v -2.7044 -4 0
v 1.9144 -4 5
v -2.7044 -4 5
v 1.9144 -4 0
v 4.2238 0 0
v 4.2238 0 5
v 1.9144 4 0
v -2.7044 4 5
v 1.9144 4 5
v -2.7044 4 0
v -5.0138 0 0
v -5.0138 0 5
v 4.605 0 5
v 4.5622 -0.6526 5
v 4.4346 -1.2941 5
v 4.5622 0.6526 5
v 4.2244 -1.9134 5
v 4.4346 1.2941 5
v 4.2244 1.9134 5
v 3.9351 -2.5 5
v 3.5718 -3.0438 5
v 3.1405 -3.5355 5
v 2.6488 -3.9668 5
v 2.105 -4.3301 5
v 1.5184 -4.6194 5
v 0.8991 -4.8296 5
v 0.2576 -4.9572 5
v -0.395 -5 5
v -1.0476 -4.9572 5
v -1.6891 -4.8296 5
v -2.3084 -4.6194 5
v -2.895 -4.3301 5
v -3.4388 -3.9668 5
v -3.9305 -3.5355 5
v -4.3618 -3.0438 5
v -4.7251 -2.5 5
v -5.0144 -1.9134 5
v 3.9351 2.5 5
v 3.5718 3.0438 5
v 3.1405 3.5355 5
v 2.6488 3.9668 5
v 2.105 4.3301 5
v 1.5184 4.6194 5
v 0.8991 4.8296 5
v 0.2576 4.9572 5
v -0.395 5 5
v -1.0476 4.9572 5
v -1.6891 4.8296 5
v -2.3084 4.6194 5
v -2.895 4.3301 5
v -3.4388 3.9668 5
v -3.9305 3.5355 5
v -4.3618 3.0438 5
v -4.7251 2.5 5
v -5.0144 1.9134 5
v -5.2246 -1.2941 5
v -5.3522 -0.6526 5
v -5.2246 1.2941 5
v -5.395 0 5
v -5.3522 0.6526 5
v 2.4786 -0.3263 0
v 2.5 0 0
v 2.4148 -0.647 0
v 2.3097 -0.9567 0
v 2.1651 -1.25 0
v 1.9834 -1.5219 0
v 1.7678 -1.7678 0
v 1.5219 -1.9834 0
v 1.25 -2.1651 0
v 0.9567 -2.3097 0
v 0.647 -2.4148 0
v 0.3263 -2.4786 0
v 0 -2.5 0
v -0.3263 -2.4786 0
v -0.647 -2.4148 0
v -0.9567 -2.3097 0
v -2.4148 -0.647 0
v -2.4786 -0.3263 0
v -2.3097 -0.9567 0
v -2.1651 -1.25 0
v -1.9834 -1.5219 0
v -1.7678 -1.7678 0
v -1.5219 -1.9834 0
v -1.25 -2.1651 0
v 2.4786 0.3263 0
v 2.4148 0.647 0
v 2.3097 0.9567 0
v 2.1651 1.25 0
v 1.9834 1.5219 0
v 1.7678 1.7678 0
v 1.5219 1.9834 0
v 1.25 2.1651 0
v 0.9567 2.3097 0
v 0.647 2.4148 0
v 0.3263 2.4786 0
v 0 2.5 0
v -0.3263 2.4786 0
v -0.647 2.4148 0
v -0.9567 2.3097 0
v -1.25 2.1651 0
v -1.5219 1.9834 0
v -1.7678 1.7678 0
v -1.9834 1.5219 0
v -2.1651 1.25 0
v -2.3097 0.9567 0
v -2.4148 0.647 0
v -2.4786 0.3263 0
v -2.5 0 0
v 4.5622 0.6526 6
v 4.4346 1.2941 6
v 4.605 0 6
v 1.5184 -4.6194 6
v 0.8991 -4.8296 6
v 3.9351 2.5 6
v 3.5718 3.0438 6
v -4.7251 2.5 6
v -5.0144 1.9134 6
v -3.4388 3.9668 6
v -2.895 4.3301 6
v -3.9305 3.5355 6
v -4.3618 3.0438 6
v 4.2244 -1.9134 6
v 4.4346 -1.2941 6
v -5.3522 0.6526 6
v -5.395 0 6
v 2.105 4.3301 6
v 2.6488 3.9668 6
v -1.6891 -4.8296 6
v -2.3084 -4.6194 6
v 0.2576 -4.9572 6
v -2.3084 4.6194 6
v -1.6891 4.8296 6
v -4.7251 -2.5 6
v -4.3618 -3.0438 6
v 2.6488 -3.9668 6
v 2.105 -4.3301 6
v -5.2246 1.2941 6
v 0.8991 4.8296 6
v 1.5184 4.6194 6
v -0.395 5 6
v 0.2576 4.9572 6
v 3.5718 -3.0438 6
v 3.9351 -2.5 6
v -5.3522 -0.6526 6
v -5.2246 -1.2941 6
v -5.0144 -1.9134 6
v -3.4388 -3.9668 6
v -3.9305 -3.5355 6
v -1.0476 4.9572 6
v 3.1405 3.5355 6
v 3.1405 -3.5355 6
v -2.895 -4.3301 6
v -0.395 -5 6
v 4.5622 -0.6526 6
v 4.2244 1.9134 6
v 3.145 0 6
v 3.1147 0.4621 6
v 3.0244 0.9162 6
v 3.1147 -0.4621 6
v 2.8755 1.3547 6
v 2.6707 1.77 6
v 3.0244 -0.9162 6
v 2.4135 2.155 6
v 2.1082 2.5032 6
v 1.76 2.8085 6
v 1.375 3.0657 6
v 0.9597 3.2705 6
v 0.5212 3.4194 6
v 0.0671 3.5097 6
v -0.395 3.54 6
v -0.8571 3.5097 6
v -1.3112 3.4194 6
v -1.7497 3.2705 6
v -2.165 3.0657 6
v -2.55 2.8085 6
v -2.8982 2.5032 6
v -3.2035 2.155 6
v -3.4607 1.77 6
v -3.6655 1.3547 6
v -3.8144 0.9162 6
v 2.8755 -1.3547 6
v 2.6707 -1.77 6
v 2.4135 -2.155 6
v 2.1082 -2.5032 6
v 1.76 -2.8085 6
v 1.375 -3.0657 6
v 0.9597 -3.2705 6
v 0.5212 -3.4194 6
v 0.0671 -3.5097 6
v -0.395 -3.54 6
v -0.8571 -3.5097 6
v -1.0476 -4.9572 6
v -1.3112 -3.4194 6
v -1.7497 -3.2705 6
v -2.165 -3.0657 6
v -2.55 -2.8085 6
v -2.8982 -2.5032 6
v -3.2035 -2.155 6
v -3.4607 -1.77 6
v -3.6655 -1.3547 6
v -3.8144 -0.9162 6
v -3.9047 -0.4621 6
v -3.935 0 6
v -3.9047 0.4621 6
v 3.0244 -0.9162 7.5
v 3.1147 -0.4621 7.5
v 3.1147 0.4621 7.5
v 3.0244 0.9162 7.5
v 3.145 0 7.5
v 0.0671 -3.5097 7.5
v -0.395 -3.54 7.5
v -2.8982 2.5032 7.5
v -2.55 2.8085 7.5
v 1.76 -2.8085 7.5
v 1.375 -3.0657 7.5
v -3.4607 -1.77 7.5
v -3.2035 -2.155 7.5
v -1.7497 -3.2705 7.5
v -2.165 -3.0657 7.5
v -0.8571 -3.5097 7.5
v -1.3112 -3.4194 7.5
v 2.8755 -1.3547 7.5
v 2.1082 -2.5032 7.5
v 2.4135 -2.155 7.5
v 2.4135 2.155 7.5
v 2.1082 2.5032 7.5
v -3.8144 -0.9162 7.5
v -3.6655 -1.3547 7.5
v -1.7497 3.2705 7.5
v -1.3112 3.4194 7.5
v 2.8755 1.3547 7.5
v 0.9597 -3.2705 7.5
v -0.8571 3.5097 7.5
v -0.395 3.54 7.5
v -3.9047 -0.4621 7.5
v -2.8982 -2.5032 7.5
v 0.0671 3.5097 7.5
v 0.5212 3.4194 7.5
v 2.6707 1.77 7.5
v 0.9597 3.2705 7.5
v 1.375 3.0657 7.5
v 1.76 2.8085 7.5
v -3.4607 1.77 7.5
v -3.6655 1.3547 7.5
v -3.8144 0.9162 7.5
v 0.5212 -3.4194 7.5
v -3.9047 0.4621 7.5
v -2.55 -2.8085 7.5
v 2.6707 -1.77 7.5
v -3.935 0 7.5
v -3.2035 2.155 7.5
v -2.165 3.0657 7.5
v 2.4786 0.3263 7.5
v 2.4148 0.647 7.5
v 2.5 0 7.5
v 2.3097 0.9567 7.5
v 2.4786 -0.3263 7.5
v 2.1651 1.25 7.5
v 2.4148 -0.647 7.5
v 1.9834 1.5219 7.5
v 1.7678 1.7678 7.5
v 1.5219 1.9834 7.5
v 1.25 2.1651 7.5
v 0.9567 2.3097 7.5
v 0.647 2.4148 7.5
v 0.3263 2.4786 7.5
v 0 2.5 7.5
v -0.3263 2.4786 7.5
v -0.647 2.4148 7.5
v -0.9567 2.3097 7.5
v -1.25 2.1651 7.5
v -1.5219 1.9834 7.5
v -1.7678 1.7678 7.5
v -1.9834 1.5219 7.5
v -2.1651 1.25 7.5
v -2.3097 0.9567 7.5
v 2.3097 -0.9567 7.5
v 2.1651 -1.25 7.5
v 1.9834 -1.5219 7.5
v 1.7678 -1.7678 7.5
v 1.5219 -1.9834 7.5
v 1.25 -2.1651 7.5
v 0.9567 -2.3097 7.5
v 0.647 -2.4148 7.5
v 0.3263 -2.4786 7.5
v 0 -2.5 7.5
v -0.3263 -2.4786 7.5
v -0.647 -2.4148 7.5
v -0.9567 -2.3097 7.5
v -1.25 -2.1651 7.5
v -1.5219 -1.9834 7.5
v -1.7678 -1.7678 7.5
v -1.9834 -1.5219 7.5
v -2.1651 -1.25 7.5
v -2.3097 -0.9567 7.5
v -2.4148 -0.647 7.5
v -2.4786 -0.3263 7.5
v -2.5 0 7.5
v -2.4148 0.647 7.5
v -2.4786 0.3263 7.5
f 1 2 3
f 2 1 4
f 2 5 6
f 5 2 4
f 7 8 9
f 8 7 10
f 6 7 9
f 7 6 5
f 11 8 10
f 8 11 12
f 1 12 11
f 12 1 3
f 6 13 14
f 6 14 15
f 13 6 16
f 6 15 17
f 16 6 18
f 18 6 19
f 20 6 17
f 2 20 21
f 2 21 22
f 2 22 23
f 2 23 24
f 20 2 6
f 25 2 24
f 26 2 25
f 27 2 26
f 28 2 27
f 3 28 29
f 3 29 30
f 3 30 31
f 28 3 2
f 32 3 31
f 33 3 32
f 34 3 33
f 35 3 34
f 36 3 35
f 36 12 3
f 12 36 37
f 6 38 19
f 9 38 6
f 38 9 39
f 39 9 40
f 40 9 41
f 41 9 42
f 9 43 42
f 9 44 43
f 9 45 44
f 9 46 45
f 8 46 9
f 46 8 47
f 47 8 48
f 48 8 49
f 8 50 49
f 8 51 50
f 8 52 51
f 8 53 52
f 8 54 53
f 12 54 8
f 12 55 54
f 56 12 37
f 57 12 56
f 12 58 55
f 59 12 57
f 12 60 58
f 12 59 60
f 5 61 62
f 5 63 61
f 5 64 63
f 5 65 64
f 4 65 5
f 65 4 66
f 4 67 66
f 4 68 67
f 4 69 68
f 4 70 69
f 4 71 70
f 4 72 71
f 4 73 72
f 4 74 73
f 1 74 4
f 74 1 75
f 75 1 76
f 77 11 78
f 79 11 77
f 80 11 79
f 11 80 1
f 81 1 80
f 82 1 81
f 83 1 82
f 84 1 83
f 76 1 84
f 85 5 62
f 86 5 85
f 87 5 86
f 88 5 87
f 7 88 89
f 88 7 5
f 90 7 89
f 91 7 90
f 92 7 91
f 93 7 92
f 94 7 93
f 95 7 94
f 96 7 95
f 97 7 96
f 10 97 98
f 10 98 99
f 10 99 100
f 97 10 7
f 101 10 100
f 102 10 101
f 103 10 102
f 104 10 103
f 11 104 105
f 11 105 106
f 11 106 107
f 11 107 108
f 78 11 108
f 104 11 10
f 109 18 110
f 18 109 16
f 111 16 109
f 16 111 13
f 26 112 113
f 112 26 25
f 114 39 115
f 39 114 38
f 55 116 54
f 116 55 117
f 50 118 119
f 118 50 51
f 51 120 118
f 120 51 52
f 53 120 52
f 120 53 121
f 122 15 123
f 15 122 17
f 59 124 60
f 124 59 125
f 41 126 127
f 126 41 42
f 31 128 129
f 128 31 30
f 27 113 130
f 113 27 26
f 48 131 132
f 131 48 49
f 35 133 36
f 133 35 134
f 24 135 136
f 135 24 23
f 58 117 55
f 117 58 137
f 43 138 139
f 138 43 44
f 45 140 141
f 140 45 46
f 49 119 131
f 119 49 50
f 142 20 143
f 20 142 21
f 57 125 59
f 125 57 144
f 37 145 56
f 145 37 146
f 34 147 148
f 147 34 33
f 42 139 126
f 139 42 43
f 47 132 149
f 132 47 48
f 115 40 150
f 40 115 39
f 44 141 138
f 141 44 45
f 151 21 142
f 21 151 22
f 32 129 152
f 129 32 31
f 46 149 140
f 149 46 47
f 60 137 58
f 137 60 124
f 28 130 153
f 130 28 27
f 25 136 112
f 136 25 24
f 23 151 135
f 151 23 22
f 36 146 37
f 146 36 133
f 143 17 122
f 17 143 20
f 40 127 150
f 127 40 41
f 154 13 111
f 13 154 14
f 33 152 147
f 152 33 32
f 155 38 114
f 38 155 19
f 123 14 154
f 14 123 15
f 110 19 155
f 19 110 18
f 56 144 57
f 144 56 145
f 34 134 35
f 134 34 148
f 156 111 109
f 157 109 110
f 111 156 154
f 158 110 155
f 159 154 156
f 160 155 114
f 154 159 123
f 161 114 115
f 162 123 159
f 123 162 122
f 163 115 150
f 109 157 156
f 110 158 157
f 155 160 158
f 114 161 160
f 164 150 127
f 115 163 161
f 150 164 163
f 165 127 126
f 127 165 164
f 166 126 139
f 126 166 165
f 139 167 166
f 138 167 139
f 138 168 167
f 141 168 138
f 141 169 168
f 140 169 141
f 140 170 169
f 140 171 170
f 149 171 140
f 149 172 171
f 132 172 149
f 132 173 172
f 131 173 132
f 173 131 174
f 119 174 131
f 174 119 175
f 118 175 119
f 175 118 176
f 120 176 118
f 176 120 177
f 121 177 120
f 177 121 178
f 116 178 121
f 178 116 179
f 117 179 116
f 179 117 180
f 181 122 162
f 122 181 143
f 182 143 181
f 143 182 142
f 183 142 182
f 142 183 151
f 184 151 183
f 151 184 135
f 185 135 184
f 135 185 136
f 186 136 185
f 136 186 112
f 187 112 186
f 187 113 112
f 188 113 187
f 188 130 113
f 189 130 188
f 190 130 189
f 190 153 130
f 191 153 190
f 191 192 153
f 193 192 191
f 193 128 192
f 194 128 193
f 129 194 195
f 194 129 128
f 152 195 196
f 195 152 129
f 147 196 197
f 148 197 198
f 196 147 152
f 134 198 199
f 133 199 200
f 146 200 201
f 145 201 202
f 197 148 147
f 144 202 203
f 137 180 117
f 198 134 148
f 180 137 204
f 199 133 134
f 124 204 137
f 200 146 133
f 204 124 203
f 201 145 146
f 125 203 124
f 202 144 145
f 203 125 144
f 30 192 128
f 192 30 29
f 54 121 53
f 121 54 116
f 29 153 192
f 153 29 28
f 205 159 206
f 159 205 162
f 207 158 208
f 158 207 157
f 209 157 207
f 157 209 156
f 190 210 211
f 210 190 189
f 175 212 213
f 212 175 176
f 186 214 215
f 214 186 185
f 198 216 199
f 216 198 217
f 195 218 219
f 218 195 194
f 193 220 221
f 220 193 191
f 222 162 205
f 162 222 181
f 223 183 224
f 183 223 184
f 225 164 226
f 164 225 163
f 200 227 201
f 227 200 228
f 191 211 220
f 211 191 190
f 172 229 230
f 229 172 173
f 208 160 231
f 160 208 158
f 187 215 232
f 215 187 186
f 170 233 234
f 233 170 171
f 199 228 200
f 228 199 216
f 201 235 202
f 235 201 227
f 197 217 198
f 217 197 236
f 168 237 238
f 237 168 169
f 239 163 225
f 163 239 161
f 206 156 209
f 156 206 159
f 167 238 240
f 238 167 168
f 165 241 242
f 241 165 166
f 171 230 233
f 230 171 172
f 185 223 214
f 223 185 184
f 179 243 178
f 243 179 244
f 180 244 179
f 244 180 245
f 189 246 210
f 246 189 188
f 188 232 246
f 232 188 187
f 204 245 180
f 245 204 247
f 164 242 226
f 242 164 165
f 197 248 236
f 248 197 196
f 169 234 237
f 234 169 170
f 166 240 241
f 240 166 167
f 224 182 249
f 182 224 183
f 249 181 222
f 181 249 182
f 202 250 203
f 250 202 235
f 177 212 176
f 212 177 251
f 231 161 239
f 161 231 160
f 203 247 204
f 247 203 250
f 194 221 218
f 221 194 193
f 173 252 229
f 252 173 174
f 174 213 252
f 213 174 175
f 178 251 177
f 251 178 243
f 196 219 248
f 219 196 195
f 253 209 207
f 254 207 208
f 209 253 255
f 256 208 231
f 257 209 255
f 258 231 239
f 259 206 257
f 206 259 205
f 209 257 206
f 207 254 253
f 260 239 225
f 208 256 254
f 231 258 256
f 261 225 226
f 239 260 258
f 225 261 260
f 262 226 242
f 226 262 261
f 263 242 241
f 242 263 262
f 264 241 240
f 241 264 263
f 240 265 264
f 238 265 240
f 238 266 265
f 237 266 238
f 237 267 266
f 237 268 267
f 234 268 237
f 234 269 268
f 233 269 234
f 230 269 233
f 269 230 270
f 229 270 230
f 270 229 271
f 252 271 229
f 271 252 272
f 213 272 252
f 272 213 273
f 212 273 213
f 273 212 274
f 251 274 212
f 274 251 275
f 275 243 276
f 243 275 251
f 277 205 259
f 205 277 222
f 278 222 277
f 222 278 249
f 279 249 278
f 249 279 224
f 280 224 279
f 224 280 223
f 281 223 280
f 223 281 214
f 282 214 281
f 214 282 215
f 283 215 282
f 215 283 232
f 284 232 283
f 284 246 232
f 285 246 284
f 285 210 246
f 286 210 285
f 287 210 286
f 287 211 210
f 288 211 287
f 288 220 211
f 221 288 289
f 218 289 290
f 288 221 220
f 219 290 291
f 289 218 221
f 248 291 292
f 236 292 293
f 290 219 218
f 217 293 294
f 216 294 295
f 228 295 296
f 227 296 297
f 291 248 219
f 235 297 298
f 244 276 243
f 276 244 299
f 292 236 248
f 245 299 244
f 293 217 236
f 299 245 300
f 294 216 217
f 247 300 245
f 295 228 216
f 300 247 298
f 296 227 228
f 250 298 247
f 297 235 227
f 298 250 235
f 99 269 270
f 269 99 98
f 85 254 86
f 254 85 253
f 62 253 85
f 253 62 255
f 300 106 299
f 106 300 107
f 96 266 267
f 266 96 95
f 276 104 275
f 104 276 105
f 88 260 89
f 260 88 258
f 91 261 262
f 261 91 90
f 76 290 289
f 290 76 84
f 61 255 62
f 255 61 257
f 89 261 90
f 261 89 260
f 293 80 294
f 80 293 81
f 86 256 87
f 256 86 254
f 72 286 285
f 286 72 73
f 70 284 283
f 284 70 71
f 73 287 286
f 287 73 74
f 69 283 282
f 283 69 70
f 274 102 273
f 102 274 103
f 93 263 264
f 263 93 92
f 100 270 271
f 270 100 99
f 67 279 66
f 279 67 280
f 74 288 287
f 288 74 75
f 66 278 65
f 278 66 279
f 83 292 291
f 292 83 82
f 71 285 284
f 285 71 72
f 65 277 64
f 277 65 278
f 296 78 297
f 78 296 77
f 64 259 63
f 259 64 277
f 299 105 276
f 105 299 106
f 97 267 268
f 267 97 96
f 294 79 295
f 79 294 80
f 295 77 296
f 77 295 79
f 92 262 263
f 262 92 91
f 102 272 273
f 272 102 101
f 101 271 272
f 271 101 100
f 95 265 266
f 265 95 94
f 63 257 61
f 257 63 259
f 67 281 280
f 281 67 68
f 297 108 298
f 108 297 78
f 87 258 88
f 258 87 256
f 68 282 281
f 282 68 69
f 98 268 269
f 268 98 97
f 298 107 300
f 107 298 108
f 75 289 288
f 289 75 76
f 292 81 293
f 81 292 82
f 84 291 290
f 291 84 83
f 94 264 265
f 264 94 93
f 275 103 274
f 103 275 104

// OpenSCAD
// Nominal 6 mm spacer family, axis Z, wheel face at Z=0.
// Supplier: https://www.makerstore.com.au/product/shim-eccentric-8-6/
// 8 mm AF, 10 mm flange, 5 mm bore, 7.11 mm plate hole, ~0.79 travel.
// Flange/collar thicknesses and 7.08 pilot OD are provisional.
function spacer_eccentricity() = 0.79/2;
function spacer_plate_hole() = 7.11;
module wheel_spacer(eccentric=false,angle=0) {
    e=spacer_eccentricity();
    // Origin stays on the axle; the locating pilot is offset from it.
    rotate([0,0,angle]) difference() {
        if(eccentric) translate([-e,0,0]) union() {
            cylinder(h=5,d=8/cos(30),$fn=6);
            translate([0,0,5]) cylinder(h=1,d=10,$fn=48);
            translate([0,0,6]) cylinder(h=1.5,d=7.08,$fn=48);
        }
        else cylinder(h=6,d=8,$fn=48);
        translate([0,0,-0.1]) cylinder(h=8,d=5,$fn=48);
    }
}
color([0.65,0.69,0.72]) wheel_spacer(true);
